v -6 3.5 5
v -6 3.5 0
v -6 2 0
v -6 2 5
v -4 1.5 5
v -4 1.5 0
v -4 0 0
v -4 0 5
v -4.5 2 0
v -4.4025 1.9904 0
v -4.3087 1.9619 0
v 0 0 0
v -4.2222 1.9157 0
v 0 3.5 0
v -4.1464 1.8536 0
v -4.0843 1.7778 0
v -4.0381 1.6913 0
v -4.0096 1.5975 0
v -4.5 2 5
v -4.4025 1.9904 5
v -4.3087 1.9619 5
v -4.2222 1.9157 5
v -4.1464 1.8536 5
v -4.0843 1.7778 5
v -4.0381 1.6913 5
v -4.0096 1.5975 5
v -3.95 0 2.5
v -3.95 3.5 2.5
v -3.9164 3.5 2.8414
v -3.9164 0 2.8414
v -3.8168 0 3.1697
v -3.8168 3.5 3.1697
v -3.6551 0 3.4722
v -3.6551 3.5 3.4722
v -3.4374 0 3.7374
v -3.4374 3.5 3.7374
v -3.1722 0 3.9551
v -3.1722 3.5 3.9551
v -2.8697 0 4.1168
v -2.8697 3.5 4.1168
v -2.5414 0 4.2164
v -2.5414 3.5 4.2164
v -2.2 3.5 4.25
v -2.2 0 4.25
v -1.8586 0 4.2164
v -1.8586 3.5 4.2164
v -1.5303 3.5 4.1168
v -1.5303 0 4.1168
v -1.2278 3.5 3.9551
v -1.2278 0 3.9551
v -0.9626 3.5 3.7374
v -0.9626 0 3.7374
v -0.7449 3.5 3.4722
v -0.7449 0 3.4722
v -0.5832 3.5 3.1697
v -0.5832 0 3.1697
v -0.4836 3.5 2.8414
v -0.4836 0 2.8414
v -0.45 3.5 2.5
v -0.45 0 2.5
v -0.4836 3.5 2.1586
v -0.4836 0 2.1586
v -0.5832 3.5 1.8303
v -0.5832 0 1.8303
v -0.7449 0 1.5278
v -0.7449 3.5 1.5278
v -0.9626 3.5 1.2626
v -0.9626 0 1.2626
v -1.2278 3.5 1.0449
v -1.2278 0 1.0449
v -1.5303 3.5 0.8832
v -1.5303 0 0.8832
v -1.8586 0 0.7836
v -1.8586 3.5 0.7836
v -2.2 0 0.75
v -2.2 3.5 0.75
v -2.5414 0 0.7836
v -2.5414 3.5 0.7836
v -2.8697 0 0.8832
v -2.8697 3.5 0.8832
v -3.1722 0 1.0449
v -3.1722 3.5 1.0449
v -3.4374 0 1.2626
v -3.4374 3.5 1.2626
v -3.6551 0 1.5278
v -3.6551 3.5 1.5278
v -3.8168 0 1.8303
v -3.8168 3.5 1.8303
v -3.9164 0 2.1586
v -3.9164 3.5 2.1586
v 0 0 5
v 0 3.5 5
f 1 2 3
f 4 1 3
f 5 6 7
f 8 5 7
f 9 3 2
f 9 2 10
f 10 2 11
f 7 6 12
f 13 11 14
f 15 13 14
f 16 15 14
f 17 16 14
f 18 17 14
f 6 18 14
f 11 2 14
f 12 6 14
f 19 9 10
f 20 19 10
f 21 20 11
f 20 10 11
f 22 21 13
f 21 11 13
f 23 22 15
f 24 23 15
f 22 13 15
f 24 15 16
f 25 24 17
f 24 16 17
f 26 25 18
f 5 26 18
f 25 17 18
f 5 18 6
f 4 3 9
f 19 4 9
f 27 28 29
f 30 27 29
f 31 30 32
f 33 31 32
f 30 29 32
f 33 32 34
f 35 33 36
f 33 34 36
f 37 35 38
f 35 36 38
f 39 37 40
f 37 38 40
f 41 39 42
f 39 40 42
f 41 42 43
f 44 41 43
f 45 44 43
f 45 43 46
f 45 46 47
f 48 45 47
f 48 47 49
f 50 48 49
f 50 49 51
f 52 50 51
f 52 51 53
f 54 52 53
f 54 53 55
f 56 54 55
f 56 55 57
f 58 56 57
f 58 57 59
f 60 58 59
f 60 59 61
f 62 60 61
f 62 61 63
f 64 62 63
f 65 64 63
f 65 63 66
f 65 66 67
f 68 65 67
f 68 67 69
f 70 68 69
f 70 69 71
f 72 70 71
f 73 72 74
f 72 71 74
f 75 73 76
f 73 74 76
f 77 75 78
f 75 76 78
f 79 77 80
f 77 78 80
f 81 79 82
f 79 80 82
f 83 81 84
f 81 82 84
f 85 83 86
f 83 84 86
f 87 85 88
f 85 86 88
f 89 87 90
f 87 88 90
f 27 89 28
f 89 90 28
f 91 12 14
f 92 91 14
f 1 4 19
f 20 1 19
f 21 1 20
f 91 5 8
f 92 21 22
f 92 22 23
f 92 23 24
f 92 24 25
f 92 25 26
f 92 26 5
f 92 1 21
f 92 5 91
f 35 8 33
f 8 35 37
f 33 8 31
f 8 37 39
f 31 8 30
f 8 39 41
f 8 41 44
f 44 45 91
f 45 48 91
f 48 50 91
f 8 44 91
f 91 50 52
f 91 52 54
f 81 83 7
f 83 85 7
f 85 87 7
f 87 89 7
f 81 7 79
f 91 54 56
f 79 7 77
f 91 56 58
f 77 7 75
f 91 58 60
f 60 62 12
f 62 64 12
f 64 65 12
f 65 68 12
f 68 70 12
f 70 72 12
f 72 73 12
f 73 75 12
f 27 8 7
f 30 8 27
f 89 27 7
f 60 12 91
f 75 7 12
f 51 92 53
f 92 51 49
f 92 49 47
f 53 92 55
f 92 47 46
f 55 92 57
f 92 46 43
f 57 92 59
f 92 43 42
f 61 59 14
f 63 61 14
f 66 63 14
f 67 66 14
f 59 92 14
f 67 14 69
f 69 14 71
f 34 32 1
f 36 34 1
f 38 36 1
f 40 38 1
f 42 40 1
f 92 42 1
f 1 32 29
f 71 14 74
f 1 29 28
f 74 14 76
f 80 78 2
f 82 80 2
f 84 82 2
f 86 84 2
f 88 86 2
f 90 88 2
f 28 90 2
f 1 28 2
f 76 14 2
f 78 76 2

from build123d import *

# Parameters (mm, degrees)
F1_DEPTH = 5
F2_R     = 1.75
F3_DEPTH = 25


with BuildPart() as f1:
    # F0 (on Top) → F1 (new body)
    with BuildSketch(Plane.XY):
        with BuildLine():
            Line((-4, 0), (0, 0))
            Line((0, 0), (0, 3.5))
            Line((0, 3.5), (-6, 3.5))
            Line((-6, 3.5), (-6, 2))
            Line((-6, 2), (-4.5, 2))
            ThreePointArc((-4.5, 2), (-4.146447, 1.853553), (-4, 1.5))
            Line((-4, 1.5), (-4, 0))
        make_face()
    extrude(amount=F1_DEPTH)

    # F2 (on face) → F3 (cut)
    with BuildSketch(Plane(origin=(0, 3.5, 0), x_dir=(-1, 0, 0), z_dir=(0, 1, 0))):
        with Locations((2.2, 2.5)):
            Circle(F2_R)
    extrude(amount=-F3_DEPTH, mode=Mode.SUBTRACT)


solid = f1.part
